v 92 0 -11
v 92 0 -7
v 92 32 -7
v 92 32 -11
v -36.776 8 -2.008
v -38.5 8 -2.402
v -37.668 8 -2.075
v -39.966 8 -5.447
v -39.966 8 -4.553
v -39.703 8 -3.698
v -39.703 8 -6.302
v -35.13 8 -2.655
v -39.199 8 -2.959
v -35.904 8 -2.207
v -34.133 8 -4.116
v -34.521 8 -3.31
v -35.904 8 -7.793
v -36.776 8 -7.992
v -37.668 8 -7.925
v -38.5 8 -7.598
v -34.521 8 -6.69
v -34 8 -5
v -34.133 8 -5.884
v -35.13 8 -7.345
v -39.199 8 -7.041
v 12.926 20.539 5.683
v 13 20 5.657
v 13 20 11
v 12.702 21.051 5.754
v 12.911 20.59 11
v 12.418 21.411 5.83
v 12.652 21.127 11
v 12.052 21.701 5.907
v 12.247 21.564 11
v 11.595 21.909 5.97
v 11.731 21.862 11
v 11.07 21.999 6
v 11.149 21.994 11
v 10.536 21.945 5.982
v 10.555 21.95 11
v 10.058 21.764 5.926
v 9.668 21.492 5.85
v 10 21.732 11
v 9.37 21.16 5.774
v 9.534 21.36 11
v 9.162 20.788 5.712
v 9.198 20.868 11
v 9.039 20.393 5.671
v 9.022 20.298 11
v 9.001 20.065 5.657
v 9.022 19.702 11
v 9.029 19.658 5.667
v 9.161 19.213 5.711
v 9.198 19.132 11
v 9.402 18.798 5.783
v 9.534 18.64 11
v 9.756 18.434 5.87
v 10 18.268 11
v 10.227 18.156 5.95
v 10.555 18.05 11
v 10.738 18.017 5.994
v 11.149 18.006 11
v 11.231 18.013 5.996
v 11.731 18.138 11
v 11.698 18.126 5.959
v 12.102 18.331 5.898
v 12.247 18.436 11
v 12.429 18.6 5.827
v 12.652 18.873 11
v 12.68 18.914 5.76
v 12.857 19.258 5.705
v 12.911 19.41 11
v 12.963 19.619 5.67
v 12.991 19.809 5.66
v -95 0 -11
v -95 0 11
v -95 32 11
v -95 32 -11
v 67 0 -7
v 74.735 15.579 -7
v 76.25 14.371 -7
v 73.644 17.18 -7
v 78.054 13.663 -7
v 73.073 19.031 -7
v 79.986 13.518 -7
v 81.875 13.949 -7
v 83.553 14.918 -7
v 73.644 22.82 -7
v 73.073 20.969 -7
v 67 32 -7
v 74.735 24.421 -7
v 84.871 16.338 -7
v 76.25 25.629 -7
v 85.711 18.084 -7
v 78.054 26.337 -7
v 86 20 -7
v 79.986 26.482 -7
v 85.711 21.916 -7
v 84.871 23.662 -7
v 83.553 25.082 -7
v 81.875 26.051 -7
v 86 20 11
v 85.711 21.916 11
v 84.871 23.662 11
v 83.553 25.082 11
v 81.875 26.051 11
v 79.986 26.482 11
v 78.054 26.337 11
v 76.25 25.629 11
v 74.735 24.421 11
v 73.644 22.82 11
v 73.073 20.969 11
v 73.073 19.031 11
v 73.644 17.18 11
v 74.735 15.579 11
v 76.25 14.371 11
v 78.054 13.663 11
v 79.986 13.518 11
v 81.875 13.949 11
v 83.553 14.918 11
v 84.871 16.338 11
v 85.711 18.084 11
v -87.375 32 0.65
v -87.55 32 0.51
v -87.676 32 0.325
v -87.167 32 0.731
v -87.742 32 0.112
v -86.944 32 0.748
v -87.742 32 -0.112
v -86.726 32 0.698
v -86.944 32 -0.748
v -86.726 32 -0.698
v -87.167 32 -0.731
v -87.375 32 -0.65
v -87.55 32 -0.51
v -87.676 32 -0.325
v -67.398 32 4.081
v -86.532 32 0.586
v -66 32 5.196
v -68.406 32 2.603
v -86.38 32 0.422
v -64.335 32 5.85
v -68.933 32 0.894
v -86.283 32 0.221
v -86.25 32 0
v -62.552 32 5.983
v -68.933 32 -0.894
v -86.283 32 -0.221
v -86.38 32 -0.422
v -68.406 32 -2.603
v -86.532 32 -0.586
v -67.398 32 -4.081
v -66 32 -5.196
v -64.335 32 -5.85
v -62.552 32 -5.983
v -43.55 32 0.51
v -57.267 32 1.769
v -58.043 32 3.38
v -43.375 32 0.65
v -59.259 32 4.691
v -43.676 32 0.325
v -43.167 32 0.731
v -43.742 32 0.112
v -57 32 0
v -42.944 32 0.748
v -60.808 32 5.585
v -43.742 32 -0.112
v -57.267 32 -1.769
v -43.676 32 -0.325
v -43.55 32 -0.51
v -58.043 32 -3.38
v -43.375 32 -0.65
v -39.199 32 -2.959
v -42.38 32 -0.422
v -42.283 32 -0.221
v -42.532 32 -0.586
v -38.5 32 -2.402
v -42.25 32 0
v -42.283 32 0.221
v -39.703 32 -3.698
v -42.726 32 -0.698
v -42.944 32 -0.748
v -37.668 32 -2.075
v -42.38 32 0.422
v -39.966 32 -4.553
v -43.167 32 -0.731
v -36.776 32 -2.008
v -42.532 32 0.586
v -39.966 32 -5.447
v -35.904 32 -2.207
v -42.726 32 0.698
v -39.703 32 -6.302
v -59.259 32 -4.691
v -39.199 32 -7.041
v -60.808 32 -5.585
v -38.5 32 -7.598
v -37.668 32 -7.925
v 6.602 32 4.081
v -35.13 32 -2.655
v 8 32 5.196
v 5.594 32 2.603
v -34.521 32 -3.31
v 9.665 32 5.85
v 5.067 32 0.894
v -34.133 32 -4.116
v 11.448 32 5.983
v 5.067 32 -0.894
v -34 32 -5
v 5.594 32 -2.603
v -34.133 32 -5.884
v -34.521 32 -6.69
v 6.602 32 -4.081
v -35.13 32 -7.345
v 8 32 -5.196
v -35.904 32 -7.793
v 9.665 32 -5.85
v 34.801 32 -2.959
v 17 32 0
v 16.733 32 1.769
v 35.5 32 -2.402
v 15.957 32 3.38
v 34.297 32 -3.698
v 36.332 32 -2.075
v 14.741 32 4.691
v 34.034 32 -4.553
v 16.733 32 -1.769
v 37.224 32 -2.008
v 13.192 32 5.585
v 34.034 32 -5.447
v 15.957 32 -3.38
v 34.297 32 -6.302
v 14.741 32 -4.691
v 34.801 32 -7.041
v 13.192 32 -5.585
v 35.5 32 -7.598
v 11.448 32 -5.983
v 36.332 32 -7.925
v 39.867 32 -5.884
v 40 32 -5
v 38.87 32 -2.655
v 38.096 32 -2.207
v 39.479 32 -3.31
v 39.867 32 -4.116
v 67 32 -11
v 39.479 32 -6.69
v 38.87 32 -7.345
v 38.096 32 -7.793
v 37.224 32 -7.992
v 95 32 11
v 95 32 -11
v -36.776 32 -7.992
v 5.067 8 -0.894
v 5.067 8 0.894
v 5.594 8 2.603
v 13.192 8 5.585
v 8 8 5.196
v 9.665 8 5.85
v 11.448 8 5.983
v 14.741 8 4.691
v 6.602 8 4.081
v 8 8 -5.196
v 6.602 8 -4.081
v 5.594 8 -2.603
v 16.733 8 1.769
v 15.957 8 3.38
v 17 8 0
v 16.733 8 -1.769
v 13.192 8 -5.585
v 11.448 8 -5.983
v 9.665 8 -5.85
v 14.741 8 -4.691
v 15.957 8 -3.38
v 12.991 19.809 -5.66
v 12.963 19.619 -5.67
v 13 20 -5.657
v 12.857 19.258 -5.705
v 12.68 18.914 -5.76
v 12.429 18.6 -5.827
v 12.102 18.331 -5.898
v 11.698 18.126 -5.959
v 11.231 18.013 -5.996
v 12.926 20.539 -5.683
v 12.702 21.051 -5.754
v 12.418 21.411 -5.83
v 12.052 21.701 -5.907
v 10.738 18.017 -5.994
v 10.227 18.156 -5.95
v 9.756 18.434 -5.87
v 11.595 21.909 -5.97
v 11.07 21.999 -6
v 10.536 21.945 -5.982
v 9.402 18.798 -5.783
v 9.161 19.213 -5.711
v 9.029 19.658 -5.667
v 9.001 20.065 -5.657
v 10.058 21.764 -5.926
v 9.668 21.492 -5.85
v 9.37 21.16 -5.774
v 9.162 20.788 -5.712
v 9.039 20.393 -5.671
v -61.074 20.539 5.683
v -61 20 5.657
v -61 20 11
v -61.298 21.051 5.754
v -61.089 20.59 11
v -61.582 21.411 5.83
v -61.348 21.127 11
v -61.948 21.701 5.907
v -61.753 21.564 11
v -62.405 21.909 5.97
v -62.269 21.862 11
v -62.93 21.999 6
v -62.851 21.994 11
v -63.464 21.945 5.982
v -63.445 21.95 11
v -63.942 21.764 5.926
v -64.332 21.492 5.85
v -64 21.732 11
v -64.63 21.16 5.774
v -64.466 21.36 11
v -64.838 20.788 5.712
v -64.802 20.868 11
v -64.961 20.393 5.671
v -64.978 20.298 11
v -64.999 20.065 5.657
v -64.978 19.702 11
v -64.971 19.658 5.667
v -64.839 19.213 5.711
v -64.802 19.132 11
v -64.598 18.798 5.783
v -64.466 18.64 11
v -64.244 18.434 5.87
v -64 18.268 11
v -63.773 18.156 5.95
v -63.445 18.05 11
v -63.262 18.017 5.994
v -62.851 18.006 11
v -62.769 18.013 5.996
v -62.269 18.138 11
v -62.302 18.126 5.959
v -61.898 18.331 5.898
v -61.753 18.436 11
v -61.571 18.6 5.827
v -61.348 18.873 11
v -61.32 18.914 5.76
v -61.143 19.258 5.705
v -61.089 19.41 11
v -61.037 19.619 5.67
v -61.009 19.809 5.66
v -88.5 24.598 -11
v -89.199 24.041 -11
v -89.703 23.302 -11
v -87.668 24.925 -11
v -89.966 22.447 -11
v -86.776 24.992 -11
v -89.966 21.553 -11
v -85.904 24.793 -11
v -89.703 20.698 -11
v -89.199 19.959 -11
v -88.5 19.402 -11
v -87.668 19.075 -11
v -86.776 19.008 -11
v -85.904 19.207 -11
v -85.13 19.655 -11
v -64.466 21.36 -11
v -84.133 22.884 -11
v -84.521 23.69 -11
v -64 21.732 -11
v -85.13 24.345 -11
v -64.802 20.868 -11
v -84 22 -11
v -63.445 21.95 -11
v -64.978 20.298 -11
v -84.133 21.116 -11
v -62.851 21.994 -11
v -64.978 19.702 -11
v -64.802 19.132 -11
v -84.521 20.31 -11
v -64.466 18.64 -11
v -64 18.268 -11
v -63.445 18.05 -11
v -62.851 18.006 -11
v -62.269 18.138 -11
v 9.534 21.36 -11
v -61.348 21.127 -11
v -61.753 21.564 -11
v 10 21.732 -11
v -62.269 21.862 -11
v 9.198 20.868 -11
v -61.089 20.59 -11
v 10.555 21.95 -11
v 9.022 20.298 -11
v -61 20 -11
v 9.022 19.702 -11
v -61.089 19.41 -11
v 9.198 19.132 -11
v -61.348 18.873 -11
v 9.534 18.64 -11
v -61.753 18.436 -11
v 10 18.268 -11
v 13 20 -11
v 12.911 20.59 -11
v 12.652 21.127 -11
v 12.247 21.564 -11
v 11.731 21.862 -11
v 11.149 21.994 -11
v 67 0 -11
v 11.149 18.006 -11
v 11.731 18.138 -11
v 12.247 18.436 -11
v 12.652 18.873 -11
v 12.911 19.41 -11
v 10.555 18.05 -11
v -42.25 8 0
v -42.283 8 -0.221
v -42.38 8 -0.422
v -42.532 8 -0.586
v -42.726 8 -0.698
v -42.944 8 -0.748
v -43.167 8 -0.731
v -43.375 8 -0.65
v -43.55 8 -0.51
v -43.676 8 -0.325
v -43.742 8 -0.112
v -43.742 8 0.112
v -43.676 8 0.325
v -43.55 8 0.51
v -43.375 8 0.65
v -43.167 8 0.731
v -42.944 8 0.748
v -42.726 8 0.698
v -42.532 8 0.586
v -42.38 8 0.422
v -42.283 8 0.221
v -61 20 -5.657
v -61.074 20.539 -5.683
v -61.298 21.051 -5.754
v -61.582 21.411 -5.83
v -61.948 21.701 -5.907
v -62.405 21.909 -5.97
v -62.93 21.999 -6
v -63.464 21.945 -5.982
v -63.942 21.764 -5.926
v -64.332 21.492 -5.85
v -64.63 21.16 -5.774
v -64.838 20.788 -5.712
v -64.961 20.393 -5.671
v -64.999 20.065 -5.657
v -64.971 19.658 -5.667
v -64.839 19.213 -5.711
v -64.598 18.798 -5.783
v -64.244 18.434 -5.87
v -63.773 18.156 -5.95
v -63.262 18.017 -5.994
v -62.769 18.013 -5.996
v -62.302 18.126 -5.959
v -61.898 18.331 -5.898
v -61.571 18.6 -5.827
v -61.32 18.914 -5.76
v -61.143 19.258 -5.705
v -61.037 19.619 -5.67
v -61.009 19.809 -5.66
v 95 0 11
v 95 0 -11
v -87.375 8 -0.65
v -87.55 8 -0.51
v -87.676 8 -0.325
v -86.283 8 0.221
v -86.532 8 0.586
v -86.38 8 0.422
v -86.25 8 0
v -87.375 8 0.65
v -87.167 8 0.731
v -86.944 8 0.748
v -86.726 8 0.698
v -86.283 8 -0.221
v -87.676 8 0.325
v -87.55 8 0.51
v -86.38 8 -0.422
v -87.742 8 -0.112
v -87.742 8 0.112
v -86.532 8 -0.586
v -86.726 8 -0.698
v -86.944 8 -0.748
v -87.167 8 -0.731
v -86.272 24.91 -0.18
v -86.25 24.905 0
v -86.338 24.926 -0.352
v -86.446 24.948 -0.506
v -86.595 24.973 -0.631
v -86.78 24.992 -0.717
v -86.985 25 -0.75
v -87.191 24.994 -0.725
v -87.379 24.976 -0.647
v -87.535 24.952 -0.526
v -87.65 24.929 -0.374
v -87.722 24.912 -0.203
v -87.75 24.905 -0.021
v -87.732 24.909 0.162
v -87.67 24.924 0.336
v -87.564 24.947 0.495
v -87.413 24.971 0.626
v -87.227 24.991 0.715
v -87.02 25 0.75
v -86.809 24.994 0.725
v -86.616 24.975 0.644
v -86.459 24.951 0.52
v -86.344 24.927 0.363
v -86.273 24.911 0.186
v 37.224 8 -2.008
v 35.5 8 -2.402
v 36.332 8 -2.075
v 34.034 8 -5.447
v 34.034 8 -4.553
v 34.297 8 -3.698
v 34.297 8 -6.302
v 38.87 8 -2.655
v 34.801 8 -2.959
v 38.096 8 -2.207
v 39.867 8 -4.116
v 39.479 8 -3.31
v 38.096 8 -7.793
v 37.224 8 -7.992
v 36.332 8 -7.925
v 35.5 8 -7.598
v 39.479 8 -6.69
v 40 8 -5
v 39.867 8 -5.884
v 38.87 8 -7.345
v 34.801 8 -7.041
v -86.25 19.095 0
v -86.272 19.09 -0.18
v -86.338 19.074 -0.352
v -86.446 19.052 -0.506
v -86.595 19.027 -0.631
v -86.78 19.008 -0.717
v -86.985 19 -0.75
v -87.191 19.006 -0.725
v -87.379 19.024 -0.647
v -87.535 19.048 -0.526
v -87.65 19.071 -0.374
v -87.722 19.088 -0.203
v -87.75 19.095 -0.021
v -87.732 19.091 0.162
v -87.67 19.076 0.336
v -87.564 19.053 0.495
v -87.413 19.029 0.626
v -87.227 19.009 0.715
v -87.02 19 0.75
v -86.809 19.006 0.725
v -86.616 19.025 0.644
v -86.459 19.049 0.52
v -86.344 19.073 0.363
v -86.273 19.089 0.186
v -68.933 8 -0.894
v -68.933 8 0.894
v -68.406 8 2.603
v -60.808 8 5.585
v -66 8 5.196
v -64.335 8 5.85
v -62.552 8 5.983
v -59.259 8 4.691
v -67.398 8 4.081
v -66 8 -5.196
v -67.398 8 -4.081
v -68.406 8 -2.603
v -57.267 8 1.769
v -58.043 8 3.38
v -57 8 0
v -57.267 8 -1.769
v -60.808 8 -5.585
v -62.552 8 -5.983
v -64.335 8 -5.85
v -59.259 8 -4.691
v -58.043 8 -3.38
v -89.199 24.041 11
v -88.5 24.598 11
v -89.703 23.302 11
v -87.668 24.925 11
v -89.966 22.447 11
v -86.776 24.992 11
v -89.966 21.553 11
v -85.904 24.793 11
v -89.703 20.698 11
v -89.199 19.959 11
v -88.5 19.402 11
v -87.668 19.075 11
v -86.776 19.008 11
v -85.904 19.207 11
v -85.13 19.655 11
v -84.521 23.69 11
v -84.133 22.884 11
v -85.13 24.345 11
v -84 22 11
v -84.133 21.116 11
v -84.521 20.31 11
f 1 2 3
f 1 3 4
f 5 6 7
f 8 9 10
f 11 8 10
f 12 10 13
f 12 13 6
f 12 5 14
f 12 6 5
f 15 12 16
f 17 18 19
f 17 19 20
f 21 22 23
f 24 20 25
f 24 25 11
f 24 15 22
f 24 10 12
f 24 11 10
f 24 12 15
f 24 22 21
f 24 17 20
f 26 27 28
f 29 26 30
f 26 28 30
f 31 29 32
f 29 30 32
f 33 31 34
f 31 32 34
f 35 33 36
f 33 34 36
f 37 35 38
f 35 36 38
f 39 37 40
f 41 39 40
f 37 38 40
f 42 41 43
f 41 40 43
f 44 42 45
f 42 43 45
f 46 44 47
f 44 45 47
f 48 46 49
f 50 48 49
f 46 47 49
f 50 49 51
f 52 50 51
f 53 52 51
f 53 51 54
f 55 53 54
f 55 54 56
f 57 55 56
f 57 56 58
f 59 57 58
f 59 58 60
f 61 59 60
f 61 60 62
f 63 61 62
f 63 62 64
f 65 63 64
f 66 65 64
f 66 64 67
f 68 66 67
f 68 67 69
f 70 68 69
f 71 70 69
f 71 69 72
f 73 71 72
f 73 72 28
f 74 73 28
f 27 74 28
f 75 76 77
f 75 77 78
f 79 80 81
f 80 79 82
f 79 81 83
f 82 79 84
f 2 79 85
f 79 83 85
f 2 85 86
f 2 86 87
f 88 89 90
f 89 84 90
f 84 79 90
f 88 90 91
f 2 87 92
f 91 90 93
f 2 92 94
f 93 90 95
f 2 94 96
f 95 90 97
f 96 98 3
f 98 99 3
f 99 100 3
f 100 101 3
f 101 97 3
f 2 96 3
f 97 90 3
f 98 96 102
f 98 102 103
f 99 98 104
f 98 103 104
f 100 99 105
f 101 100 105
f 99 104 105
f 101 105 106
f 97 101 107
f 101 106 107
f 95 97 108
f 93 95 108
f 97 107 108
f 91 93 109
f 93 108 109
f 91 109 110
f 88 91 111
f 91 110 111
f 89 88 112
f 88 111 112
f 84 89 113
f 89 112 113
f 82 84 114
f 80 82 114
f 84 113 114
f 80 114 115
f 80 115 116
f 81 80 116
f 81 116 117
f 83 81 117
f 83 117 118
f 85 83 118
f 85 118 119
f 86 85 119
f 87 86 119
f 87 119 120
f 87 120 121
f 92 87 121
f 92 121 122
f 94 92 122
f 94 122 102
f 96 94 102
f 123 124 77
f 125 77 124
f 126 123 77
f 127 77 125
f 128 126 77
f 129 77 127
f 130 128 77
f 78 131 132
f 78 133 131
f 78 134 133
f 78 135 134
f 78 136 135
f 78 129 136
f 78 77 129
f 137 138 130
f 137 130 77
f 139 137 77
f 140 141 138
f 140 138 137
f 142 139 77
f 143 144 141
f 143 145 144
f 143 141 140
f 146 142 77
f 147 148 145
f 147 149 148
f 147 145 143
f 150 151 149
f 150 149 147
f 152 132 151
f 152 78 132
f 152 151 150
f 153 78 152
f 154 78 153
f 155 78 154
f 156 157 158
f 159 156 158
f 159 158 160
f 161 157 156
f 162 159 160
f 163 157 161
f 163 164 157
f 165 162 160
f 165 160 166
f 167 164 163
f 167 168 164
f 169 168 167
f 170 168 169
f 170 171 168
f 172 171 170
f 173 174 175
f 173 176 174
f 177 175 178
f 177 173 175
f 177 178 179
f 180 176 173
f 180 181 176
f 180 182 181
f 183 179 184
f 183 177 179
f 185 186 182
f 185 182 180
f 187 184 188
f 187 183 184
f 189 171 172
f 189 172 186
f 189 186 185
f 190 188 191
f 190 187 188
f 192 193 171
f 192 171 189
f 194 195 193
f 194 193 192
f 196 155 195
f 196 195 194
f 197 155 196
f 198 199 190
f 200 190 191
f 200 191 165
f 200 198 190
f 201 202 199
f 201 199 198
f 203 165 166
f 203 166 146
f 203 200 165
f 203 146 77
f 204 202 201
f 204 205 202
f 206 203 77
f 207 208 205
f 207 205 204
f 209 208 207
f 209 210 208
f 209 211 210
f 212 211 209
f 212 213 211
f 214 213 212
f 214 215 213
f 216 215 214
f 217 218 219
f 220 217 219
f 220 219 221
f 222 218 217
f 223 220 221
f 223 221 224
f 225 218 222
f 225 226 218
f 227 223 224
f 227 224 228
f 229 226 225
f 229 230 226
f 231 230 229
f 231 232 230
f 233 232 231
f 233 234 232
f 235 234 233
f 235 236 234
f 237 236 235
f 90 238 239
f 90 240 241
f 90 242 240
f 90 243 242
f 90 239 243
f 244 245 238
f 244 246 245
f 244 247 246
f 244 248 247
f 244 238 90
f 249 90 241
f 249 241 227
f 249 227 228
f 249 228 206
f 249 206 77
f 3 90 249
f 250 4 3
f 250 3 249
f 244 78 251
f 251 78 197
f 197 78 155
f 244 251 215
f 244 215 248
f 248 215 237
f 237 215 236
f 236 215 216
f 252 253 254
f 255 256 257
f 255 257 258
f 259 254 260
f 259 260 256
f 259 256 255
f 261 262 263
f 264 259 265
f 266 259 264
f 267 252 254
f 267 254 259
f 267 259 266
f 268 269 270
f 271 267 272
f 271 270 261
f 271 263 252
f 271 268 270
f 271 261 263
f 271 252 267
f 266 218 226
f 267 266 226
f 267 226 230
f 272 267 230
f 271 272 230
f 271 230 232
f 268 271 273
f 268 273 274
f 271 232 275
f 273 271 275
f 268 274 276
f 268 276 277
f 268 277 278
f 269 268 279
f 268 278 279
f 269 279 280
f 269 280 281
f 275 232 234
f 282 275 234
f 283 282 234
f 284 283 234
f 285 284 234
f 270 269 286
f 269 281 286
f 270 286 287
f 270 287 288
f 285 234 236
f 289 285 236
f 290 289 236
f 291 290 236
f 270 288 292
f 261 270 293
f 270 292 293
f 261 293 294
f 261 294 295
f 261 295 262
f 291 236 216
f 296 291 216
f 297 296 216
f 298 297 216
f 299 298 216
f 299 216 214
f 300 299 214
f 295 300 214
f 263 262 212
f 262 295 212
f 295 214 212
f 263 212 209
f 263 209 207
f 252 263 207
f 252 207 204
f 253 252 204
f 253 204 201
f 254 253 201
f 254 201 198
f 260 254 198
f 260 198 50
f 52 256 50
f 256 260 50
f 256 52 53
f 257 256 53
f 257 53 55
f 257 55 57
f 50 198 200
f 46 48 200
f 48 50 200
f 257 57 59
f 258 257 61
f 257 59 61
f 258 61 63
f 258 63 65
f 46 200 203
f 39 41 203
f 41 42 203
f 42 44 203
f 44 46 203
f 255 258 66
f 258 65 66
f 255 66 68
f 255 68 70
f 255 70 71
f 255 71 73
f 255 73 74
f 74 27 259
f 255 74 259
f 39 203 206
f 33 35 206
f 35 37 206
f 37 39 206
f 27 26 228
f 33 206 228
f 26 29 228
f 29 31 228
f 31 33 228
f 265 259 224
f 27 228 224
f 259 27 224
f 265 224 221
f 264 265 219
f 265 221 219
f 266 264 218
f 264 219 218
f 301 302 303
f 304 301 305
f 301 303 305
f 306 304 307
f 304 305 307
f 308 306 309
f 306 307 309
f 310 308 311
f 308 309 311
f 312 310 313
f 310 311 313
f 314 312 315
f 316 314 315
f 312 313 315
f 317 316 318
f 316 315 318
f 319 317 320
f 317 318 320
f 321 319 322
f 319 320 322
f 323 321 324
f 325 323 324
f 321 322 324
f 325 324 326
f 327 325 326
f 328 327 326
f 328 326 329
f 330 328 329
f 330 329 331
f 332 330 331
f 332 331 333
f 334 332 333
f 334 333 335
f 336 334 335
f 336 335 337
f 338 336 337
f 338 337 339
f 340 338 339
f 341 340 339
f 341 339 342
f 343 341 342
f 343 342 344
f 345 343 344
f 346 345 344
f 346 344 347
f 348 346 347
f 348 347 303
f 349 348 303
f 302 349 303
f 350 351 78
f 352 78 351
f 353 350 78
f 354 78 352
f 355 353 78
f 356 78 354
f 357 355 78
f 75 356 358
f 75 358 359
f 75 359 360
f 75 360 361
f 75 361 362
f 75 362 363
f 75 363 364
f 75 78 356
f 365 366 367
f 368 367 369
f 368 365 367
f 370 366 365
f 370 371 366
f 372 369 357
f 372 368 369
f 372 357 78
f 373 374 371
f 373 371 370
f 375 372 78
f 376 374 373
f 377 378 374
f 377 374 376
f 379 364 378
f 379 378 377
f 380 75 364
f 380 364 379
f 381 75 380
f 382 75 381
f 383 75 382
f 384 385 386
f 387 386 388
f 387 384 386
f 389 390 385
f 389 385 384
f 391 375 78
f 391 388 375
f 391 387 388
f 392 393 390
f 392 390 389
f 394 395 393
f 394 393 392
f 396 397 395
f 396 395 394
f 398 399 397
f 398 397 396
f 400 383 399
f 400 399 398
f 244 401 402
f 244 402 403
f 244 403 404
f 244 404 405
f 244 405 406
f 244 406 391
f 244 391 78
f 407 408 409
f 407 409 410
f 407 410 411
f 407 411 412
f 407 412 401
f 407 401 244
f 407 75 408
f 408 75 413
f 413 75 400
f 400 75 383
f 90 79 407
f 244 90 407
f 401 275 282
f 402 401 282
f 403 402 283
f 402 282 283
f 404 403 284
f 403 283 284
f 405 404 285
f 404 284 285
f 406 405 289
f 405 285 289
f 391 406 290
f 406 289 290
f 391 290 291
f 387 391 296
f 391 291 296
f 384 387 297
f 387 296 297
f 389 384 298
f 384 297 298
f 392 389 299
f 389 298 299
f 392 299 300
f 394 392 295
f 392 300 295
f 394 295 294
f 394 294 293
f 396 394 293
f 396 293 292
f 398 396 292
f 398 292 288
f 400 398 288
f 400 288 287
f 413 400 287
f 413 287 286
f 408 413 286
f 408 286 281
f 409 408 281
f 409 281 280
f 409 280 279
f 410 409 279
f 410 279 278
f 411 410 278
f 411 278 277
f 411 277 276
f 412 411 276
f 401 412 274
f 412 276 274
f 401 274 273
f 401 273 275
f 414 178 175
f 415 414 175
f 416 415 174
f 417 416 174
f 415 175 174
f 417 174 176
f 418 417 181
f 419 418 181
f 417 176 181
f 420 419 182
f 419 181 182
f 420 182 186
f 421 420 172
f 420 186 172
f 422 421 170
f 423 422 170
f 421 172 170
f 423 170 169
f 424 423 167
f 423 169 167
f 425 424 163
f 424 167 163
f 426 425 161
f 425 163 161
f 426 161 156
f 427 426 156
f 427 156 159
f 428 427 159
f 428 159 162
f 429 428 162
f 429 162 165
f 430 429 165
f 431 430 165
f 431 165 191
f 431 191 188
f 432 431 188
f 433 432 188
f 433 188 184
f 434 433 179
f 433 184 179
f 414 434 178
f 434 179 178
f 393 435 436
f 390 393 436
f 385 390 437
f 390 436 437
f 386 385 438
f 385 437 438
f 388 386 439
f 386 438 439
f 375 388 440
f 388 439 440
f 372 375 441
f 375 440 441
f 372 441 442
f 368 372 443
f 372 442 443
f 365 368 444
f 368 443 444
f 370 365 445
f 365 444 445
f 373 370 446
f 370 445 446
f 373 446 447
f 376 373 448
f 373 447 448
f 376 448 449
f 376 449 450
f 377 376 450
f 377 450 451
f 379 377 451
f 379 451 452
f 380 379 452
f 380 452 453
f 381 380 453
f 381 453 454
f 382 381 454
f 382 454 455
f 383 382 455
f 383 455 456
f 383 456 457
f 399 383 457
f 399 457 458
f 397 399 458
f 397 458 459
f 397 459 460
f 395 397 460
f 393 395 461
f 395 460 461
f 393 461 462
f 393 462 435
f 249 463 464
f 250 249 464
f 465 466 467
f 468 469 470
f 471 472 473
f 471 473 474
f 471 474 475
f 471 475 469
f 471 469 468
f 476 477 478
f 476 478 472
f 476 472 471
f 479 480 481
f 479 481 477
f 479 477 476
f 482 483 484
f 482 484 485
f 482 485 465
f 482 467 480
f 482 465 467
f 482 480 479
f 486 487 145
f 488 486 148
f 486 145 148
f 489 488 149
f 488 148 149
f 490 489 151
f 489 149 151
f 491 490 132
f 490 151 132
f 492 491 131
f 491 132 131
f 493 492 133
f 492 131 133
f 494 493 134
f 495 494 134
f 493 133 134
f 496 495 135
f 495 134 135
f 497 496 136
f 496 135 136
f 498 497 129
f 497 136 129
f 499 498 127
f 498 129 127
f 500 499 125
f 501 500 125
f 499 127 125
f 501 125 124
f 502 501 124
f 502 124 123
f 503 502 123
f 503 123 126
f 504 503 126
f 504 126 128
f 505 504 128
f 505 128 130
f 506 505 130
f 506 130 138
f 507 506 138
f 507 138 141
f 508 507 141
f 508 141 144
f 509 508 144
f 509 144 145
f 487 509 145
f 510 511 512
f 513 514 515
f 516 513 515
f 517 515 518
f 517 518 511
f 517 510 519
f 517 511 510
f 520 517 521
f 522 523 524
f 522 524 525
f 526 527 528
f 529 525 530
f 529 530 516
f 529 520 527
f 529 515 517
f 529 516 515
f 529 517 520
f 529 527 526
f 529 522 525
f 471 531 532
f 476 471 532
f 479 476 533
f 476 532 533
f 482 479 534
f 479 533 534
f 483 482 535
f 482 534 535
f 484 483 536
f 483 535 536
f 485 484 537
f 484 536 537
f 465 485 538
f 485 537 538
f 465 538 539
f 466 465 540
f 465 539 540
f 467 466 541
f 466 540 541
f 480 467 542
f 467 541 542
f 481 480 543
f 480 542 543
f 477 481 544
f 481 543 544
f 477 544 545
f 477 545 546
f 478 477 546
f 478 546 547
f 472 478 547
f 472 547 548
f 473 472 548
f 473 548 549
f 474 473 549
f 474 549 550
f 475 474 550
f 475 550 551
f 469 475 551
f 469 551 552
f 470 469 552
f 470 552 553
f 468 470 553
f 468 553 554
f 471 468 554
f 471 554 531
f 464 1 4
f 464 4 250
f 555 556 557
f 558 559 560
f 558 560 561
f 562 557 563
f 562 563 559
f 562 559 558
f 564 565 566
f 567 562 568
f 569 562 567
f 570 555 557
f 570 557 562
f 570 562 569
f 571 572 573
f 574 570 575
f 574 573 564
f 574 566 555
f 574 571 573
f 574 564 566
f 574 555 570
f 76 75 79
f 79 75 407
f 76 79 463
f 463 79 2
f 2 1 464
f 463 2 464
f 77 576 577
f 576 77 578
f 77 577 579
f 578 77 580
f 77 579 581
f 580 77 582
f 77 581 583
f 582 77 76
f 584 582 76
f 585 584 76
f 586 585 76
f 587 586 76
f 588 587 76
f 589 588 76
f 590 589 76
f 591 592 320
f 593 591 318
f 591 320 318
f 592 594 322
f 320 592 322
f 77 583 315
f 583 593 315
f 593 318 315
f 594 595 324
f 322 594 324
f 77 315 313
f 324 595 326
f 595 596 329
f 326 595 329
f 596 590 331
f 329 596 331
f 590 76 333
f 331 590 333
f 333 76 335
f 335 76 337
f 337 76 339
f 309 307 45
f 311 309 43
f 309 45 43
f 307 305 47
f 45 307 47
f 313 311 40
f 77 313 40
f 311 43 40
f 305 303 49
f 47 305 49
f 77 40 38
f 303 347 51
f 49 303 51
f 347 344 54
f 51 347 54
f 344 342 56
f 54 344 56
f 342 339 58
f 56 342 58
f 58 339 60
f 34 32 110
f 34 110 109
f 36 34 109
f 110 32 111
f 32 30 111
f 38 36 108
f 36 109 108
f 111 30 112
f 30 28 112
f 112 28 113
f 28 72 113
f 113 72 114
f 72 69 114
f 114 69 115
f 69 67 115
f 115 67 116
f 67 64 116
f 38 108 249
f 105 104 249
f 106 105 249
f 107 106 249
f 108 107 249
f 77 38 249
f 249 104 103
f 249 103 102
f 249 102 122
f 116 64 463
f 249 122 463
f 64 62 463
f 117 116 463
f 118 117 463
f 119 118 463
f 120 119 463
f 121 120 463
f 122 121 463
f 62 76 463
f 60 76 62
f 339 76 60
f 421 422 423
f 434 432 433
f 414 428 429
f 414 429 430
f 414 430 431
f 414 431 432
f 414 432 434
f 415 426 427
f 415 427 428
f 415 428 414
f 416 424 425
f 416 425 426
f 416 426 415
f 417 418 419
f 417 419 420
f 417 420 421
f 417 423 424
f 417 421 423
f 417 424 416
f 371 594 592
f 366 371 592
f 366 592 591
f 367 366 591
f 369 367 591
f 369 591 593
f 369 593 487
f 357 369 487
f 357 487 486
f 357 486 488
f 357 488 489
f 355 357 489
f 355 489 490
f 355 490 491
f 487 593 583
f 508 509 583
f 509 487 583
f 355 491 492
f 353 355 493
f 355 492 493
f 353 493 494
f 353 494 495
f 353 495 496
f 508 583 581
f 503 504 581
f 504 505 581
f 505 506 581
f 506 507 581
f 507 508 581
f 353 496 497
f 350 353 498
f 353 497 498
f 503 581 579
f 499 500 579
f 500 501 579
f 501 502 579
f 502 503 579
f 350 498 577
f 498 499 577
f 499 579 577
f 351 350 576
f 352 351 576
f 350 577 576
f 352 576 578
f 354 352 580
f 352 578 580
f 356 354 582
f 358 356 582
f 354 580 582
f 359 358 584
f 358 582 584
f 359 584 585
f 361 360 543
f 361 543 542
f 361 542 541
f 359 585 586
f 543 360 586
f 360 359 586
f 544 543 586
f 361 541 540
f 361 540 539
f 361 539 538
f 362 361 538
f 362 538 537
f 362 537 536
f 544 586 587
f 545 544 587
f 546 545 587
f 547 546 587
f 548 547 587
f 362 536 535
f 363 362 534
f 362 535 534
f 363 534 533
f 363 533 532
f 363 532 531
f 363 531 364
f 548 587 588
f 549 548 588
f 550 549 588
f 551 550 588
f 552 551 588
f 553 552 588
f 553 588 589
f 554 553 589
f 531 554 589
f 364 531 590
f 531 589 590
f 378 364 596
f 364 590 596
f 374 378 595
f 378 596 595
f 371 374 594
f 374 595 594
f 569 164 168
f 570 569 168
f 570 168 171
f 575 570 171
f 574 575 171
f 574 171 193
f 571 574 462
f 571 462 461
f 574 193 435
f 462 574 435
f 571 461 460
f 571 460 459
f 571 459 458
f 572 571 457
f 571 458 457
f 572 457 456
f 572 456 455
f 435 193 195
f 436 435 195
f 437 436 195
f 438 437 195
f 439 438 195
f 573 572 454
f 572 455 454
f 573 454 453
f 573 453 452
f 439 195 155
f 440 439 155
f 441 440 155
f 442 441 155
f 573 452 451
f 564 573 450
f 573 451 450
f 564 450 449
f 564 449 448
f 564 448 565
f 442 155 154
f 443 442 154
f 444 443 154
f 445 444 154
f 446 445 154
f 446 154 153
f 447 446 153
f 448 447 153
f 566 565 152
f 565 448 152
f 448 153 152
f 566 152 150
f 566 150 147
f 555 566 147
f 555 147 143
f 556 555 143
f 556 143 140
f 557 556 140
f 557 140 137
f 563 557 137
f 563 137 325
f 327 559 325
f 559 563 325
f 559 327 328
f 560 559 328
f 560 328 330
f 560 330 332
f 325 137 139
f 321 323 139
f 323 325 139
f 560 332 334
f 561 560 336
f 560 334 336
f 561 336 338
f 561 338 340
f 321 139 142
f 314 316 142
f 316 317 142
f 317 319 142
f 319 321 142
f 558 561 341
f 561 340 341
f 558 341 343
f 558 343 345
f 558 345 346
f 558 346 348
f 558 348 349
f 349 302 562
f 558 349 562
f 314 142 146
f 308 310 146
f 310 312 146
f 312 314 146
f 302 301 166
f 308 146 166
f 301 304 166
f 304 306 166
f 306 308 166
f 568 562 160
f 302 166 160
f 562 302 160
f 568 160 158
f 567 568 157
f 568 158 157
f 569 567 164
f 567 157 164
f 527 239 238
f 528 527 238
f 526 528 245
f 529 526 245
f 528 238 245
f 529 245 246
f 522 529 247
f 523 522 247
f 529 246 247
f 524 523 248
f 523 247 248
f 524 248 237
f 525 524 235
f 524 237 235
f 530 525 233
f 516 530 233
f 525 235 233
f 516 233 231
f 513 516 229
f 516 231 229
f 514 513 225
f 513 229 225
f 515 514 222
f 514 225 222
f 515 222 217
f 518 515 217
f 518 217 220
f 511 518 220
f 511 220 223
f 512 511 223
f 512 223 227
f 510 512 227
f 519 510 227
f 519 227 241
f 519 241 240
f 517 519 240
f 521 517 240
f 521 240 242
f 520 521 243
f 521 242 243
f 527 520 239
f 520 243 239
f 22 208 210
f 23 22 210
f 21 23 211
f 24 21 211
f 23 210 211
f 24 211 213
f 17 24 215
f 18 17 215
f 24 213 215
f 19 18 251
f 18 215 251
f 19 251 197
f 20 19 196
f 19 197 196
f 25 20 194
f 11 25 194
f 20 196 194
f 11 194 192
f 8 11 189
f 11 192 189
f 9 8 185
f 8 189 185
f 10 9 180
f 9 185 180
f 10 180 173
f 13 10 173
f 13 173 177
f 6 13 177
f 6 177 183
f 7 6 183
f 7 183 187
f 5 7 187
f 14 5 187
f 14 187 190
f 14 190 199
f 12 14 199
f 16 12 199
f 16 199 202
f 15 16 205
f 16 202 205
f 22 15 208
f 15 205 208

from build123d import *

# Parameters (mm, degrees)
SKETCH2_W           = 190
SKETCH2_H           = 22
BOSS_EXTRUDE1_DEPTH = 32
SKETCH3_R           = 0.75
SKETCH3_R_2         = 6
SKETCH3_R_3         = 3
SKETCH3_W           = 25
SKETCH3_H           = 4
CUT_EXTRUDE1_DEPTH  = 24
SKETCH4_W           = 25
SKETCH4_H           = 4
CUT_EXTRUDE2_DEPTH  = 9
SKETCH5_R           = 3
SKETCH5_R_2         = 2
SKETCH5_R_3         = 6.5
CUT_EXTRUDE3_DEPTH  = 24


with BuildPart() as part:
    # Sketch2 → Boss-Extrude1 (new body)
    with BuildSketch(Plane(origin=(0, 0, 0), x_dir=(1, 0, 0), z_dir=(0, 1, 0))):
        Rectangle(SKETCH2_W, SKETCH2_H)
    extrude(amount=BOSS_EXTRUDE1_DEPTH)

    # Sketch3 → Cut-Extrude1 (cut)
    with BuildSketch(Plane(origin=(0, 32, 0), x_dir=(1, 0, 0), z_dir=(0, 1, 0))):
        with Locations((-87, 0)):
            Circle(SKETCH3_R)
        with Locations((-63, 0)):
            Circle(SKETCH3_R_2)
        with Locations((-37, 5)):
            Circle(SKETCH3_R_3)
        with Locations((-43, 0)):
            Circle(SKETCH3_R)
        with Locations((11, 0)):
            Circle(SKETCH3_R_2)
        with Locations((37, 5)):
            Circle(SKETCH3_R_3)
        with Locations((79.5, 9)):
            Rectangle(SKETCH3_W, SKETCH3_H)
    extrude(amount=-CUT_EXTRUDE1_DEPTH, mode=Mode.SUBTRACT)

    # Sketch4 → Cut-Extrude2 (cut, through all)
    with BuildSketch(Plane(origin=(0, 8, 0), x_dir=(1, 0, 0), z_dir=(0, 1, 0))):
        with Locations((79.5, 9)):
            Rectangle(SKETCH4_W, SKETCH4_H)
    extrude(amount=-CUT_EXTRUDE2_DEPTH, mode=Mode.SUBTRACT)

    # Sketch5 → Cut-Extrude3 (cut)
    with BuildSketch(Plane.XY.offset(11)):
        with Locations((-87, 22)):
            Circle(SKETCH5_R)
        with Locations((-63, 20)):
            Circle(SKETCH5_R_2)
        with Locations((11, 20)):
            Circle(SKETCH5_R_2)
        with Locations((79.5, 20)):
            Circle(SKETCH5_R_3)
    extrude(amount=-CUT_EXTRUDE3_DEPTH, mode=Mode.SUBTRACT)


solid = part.part
